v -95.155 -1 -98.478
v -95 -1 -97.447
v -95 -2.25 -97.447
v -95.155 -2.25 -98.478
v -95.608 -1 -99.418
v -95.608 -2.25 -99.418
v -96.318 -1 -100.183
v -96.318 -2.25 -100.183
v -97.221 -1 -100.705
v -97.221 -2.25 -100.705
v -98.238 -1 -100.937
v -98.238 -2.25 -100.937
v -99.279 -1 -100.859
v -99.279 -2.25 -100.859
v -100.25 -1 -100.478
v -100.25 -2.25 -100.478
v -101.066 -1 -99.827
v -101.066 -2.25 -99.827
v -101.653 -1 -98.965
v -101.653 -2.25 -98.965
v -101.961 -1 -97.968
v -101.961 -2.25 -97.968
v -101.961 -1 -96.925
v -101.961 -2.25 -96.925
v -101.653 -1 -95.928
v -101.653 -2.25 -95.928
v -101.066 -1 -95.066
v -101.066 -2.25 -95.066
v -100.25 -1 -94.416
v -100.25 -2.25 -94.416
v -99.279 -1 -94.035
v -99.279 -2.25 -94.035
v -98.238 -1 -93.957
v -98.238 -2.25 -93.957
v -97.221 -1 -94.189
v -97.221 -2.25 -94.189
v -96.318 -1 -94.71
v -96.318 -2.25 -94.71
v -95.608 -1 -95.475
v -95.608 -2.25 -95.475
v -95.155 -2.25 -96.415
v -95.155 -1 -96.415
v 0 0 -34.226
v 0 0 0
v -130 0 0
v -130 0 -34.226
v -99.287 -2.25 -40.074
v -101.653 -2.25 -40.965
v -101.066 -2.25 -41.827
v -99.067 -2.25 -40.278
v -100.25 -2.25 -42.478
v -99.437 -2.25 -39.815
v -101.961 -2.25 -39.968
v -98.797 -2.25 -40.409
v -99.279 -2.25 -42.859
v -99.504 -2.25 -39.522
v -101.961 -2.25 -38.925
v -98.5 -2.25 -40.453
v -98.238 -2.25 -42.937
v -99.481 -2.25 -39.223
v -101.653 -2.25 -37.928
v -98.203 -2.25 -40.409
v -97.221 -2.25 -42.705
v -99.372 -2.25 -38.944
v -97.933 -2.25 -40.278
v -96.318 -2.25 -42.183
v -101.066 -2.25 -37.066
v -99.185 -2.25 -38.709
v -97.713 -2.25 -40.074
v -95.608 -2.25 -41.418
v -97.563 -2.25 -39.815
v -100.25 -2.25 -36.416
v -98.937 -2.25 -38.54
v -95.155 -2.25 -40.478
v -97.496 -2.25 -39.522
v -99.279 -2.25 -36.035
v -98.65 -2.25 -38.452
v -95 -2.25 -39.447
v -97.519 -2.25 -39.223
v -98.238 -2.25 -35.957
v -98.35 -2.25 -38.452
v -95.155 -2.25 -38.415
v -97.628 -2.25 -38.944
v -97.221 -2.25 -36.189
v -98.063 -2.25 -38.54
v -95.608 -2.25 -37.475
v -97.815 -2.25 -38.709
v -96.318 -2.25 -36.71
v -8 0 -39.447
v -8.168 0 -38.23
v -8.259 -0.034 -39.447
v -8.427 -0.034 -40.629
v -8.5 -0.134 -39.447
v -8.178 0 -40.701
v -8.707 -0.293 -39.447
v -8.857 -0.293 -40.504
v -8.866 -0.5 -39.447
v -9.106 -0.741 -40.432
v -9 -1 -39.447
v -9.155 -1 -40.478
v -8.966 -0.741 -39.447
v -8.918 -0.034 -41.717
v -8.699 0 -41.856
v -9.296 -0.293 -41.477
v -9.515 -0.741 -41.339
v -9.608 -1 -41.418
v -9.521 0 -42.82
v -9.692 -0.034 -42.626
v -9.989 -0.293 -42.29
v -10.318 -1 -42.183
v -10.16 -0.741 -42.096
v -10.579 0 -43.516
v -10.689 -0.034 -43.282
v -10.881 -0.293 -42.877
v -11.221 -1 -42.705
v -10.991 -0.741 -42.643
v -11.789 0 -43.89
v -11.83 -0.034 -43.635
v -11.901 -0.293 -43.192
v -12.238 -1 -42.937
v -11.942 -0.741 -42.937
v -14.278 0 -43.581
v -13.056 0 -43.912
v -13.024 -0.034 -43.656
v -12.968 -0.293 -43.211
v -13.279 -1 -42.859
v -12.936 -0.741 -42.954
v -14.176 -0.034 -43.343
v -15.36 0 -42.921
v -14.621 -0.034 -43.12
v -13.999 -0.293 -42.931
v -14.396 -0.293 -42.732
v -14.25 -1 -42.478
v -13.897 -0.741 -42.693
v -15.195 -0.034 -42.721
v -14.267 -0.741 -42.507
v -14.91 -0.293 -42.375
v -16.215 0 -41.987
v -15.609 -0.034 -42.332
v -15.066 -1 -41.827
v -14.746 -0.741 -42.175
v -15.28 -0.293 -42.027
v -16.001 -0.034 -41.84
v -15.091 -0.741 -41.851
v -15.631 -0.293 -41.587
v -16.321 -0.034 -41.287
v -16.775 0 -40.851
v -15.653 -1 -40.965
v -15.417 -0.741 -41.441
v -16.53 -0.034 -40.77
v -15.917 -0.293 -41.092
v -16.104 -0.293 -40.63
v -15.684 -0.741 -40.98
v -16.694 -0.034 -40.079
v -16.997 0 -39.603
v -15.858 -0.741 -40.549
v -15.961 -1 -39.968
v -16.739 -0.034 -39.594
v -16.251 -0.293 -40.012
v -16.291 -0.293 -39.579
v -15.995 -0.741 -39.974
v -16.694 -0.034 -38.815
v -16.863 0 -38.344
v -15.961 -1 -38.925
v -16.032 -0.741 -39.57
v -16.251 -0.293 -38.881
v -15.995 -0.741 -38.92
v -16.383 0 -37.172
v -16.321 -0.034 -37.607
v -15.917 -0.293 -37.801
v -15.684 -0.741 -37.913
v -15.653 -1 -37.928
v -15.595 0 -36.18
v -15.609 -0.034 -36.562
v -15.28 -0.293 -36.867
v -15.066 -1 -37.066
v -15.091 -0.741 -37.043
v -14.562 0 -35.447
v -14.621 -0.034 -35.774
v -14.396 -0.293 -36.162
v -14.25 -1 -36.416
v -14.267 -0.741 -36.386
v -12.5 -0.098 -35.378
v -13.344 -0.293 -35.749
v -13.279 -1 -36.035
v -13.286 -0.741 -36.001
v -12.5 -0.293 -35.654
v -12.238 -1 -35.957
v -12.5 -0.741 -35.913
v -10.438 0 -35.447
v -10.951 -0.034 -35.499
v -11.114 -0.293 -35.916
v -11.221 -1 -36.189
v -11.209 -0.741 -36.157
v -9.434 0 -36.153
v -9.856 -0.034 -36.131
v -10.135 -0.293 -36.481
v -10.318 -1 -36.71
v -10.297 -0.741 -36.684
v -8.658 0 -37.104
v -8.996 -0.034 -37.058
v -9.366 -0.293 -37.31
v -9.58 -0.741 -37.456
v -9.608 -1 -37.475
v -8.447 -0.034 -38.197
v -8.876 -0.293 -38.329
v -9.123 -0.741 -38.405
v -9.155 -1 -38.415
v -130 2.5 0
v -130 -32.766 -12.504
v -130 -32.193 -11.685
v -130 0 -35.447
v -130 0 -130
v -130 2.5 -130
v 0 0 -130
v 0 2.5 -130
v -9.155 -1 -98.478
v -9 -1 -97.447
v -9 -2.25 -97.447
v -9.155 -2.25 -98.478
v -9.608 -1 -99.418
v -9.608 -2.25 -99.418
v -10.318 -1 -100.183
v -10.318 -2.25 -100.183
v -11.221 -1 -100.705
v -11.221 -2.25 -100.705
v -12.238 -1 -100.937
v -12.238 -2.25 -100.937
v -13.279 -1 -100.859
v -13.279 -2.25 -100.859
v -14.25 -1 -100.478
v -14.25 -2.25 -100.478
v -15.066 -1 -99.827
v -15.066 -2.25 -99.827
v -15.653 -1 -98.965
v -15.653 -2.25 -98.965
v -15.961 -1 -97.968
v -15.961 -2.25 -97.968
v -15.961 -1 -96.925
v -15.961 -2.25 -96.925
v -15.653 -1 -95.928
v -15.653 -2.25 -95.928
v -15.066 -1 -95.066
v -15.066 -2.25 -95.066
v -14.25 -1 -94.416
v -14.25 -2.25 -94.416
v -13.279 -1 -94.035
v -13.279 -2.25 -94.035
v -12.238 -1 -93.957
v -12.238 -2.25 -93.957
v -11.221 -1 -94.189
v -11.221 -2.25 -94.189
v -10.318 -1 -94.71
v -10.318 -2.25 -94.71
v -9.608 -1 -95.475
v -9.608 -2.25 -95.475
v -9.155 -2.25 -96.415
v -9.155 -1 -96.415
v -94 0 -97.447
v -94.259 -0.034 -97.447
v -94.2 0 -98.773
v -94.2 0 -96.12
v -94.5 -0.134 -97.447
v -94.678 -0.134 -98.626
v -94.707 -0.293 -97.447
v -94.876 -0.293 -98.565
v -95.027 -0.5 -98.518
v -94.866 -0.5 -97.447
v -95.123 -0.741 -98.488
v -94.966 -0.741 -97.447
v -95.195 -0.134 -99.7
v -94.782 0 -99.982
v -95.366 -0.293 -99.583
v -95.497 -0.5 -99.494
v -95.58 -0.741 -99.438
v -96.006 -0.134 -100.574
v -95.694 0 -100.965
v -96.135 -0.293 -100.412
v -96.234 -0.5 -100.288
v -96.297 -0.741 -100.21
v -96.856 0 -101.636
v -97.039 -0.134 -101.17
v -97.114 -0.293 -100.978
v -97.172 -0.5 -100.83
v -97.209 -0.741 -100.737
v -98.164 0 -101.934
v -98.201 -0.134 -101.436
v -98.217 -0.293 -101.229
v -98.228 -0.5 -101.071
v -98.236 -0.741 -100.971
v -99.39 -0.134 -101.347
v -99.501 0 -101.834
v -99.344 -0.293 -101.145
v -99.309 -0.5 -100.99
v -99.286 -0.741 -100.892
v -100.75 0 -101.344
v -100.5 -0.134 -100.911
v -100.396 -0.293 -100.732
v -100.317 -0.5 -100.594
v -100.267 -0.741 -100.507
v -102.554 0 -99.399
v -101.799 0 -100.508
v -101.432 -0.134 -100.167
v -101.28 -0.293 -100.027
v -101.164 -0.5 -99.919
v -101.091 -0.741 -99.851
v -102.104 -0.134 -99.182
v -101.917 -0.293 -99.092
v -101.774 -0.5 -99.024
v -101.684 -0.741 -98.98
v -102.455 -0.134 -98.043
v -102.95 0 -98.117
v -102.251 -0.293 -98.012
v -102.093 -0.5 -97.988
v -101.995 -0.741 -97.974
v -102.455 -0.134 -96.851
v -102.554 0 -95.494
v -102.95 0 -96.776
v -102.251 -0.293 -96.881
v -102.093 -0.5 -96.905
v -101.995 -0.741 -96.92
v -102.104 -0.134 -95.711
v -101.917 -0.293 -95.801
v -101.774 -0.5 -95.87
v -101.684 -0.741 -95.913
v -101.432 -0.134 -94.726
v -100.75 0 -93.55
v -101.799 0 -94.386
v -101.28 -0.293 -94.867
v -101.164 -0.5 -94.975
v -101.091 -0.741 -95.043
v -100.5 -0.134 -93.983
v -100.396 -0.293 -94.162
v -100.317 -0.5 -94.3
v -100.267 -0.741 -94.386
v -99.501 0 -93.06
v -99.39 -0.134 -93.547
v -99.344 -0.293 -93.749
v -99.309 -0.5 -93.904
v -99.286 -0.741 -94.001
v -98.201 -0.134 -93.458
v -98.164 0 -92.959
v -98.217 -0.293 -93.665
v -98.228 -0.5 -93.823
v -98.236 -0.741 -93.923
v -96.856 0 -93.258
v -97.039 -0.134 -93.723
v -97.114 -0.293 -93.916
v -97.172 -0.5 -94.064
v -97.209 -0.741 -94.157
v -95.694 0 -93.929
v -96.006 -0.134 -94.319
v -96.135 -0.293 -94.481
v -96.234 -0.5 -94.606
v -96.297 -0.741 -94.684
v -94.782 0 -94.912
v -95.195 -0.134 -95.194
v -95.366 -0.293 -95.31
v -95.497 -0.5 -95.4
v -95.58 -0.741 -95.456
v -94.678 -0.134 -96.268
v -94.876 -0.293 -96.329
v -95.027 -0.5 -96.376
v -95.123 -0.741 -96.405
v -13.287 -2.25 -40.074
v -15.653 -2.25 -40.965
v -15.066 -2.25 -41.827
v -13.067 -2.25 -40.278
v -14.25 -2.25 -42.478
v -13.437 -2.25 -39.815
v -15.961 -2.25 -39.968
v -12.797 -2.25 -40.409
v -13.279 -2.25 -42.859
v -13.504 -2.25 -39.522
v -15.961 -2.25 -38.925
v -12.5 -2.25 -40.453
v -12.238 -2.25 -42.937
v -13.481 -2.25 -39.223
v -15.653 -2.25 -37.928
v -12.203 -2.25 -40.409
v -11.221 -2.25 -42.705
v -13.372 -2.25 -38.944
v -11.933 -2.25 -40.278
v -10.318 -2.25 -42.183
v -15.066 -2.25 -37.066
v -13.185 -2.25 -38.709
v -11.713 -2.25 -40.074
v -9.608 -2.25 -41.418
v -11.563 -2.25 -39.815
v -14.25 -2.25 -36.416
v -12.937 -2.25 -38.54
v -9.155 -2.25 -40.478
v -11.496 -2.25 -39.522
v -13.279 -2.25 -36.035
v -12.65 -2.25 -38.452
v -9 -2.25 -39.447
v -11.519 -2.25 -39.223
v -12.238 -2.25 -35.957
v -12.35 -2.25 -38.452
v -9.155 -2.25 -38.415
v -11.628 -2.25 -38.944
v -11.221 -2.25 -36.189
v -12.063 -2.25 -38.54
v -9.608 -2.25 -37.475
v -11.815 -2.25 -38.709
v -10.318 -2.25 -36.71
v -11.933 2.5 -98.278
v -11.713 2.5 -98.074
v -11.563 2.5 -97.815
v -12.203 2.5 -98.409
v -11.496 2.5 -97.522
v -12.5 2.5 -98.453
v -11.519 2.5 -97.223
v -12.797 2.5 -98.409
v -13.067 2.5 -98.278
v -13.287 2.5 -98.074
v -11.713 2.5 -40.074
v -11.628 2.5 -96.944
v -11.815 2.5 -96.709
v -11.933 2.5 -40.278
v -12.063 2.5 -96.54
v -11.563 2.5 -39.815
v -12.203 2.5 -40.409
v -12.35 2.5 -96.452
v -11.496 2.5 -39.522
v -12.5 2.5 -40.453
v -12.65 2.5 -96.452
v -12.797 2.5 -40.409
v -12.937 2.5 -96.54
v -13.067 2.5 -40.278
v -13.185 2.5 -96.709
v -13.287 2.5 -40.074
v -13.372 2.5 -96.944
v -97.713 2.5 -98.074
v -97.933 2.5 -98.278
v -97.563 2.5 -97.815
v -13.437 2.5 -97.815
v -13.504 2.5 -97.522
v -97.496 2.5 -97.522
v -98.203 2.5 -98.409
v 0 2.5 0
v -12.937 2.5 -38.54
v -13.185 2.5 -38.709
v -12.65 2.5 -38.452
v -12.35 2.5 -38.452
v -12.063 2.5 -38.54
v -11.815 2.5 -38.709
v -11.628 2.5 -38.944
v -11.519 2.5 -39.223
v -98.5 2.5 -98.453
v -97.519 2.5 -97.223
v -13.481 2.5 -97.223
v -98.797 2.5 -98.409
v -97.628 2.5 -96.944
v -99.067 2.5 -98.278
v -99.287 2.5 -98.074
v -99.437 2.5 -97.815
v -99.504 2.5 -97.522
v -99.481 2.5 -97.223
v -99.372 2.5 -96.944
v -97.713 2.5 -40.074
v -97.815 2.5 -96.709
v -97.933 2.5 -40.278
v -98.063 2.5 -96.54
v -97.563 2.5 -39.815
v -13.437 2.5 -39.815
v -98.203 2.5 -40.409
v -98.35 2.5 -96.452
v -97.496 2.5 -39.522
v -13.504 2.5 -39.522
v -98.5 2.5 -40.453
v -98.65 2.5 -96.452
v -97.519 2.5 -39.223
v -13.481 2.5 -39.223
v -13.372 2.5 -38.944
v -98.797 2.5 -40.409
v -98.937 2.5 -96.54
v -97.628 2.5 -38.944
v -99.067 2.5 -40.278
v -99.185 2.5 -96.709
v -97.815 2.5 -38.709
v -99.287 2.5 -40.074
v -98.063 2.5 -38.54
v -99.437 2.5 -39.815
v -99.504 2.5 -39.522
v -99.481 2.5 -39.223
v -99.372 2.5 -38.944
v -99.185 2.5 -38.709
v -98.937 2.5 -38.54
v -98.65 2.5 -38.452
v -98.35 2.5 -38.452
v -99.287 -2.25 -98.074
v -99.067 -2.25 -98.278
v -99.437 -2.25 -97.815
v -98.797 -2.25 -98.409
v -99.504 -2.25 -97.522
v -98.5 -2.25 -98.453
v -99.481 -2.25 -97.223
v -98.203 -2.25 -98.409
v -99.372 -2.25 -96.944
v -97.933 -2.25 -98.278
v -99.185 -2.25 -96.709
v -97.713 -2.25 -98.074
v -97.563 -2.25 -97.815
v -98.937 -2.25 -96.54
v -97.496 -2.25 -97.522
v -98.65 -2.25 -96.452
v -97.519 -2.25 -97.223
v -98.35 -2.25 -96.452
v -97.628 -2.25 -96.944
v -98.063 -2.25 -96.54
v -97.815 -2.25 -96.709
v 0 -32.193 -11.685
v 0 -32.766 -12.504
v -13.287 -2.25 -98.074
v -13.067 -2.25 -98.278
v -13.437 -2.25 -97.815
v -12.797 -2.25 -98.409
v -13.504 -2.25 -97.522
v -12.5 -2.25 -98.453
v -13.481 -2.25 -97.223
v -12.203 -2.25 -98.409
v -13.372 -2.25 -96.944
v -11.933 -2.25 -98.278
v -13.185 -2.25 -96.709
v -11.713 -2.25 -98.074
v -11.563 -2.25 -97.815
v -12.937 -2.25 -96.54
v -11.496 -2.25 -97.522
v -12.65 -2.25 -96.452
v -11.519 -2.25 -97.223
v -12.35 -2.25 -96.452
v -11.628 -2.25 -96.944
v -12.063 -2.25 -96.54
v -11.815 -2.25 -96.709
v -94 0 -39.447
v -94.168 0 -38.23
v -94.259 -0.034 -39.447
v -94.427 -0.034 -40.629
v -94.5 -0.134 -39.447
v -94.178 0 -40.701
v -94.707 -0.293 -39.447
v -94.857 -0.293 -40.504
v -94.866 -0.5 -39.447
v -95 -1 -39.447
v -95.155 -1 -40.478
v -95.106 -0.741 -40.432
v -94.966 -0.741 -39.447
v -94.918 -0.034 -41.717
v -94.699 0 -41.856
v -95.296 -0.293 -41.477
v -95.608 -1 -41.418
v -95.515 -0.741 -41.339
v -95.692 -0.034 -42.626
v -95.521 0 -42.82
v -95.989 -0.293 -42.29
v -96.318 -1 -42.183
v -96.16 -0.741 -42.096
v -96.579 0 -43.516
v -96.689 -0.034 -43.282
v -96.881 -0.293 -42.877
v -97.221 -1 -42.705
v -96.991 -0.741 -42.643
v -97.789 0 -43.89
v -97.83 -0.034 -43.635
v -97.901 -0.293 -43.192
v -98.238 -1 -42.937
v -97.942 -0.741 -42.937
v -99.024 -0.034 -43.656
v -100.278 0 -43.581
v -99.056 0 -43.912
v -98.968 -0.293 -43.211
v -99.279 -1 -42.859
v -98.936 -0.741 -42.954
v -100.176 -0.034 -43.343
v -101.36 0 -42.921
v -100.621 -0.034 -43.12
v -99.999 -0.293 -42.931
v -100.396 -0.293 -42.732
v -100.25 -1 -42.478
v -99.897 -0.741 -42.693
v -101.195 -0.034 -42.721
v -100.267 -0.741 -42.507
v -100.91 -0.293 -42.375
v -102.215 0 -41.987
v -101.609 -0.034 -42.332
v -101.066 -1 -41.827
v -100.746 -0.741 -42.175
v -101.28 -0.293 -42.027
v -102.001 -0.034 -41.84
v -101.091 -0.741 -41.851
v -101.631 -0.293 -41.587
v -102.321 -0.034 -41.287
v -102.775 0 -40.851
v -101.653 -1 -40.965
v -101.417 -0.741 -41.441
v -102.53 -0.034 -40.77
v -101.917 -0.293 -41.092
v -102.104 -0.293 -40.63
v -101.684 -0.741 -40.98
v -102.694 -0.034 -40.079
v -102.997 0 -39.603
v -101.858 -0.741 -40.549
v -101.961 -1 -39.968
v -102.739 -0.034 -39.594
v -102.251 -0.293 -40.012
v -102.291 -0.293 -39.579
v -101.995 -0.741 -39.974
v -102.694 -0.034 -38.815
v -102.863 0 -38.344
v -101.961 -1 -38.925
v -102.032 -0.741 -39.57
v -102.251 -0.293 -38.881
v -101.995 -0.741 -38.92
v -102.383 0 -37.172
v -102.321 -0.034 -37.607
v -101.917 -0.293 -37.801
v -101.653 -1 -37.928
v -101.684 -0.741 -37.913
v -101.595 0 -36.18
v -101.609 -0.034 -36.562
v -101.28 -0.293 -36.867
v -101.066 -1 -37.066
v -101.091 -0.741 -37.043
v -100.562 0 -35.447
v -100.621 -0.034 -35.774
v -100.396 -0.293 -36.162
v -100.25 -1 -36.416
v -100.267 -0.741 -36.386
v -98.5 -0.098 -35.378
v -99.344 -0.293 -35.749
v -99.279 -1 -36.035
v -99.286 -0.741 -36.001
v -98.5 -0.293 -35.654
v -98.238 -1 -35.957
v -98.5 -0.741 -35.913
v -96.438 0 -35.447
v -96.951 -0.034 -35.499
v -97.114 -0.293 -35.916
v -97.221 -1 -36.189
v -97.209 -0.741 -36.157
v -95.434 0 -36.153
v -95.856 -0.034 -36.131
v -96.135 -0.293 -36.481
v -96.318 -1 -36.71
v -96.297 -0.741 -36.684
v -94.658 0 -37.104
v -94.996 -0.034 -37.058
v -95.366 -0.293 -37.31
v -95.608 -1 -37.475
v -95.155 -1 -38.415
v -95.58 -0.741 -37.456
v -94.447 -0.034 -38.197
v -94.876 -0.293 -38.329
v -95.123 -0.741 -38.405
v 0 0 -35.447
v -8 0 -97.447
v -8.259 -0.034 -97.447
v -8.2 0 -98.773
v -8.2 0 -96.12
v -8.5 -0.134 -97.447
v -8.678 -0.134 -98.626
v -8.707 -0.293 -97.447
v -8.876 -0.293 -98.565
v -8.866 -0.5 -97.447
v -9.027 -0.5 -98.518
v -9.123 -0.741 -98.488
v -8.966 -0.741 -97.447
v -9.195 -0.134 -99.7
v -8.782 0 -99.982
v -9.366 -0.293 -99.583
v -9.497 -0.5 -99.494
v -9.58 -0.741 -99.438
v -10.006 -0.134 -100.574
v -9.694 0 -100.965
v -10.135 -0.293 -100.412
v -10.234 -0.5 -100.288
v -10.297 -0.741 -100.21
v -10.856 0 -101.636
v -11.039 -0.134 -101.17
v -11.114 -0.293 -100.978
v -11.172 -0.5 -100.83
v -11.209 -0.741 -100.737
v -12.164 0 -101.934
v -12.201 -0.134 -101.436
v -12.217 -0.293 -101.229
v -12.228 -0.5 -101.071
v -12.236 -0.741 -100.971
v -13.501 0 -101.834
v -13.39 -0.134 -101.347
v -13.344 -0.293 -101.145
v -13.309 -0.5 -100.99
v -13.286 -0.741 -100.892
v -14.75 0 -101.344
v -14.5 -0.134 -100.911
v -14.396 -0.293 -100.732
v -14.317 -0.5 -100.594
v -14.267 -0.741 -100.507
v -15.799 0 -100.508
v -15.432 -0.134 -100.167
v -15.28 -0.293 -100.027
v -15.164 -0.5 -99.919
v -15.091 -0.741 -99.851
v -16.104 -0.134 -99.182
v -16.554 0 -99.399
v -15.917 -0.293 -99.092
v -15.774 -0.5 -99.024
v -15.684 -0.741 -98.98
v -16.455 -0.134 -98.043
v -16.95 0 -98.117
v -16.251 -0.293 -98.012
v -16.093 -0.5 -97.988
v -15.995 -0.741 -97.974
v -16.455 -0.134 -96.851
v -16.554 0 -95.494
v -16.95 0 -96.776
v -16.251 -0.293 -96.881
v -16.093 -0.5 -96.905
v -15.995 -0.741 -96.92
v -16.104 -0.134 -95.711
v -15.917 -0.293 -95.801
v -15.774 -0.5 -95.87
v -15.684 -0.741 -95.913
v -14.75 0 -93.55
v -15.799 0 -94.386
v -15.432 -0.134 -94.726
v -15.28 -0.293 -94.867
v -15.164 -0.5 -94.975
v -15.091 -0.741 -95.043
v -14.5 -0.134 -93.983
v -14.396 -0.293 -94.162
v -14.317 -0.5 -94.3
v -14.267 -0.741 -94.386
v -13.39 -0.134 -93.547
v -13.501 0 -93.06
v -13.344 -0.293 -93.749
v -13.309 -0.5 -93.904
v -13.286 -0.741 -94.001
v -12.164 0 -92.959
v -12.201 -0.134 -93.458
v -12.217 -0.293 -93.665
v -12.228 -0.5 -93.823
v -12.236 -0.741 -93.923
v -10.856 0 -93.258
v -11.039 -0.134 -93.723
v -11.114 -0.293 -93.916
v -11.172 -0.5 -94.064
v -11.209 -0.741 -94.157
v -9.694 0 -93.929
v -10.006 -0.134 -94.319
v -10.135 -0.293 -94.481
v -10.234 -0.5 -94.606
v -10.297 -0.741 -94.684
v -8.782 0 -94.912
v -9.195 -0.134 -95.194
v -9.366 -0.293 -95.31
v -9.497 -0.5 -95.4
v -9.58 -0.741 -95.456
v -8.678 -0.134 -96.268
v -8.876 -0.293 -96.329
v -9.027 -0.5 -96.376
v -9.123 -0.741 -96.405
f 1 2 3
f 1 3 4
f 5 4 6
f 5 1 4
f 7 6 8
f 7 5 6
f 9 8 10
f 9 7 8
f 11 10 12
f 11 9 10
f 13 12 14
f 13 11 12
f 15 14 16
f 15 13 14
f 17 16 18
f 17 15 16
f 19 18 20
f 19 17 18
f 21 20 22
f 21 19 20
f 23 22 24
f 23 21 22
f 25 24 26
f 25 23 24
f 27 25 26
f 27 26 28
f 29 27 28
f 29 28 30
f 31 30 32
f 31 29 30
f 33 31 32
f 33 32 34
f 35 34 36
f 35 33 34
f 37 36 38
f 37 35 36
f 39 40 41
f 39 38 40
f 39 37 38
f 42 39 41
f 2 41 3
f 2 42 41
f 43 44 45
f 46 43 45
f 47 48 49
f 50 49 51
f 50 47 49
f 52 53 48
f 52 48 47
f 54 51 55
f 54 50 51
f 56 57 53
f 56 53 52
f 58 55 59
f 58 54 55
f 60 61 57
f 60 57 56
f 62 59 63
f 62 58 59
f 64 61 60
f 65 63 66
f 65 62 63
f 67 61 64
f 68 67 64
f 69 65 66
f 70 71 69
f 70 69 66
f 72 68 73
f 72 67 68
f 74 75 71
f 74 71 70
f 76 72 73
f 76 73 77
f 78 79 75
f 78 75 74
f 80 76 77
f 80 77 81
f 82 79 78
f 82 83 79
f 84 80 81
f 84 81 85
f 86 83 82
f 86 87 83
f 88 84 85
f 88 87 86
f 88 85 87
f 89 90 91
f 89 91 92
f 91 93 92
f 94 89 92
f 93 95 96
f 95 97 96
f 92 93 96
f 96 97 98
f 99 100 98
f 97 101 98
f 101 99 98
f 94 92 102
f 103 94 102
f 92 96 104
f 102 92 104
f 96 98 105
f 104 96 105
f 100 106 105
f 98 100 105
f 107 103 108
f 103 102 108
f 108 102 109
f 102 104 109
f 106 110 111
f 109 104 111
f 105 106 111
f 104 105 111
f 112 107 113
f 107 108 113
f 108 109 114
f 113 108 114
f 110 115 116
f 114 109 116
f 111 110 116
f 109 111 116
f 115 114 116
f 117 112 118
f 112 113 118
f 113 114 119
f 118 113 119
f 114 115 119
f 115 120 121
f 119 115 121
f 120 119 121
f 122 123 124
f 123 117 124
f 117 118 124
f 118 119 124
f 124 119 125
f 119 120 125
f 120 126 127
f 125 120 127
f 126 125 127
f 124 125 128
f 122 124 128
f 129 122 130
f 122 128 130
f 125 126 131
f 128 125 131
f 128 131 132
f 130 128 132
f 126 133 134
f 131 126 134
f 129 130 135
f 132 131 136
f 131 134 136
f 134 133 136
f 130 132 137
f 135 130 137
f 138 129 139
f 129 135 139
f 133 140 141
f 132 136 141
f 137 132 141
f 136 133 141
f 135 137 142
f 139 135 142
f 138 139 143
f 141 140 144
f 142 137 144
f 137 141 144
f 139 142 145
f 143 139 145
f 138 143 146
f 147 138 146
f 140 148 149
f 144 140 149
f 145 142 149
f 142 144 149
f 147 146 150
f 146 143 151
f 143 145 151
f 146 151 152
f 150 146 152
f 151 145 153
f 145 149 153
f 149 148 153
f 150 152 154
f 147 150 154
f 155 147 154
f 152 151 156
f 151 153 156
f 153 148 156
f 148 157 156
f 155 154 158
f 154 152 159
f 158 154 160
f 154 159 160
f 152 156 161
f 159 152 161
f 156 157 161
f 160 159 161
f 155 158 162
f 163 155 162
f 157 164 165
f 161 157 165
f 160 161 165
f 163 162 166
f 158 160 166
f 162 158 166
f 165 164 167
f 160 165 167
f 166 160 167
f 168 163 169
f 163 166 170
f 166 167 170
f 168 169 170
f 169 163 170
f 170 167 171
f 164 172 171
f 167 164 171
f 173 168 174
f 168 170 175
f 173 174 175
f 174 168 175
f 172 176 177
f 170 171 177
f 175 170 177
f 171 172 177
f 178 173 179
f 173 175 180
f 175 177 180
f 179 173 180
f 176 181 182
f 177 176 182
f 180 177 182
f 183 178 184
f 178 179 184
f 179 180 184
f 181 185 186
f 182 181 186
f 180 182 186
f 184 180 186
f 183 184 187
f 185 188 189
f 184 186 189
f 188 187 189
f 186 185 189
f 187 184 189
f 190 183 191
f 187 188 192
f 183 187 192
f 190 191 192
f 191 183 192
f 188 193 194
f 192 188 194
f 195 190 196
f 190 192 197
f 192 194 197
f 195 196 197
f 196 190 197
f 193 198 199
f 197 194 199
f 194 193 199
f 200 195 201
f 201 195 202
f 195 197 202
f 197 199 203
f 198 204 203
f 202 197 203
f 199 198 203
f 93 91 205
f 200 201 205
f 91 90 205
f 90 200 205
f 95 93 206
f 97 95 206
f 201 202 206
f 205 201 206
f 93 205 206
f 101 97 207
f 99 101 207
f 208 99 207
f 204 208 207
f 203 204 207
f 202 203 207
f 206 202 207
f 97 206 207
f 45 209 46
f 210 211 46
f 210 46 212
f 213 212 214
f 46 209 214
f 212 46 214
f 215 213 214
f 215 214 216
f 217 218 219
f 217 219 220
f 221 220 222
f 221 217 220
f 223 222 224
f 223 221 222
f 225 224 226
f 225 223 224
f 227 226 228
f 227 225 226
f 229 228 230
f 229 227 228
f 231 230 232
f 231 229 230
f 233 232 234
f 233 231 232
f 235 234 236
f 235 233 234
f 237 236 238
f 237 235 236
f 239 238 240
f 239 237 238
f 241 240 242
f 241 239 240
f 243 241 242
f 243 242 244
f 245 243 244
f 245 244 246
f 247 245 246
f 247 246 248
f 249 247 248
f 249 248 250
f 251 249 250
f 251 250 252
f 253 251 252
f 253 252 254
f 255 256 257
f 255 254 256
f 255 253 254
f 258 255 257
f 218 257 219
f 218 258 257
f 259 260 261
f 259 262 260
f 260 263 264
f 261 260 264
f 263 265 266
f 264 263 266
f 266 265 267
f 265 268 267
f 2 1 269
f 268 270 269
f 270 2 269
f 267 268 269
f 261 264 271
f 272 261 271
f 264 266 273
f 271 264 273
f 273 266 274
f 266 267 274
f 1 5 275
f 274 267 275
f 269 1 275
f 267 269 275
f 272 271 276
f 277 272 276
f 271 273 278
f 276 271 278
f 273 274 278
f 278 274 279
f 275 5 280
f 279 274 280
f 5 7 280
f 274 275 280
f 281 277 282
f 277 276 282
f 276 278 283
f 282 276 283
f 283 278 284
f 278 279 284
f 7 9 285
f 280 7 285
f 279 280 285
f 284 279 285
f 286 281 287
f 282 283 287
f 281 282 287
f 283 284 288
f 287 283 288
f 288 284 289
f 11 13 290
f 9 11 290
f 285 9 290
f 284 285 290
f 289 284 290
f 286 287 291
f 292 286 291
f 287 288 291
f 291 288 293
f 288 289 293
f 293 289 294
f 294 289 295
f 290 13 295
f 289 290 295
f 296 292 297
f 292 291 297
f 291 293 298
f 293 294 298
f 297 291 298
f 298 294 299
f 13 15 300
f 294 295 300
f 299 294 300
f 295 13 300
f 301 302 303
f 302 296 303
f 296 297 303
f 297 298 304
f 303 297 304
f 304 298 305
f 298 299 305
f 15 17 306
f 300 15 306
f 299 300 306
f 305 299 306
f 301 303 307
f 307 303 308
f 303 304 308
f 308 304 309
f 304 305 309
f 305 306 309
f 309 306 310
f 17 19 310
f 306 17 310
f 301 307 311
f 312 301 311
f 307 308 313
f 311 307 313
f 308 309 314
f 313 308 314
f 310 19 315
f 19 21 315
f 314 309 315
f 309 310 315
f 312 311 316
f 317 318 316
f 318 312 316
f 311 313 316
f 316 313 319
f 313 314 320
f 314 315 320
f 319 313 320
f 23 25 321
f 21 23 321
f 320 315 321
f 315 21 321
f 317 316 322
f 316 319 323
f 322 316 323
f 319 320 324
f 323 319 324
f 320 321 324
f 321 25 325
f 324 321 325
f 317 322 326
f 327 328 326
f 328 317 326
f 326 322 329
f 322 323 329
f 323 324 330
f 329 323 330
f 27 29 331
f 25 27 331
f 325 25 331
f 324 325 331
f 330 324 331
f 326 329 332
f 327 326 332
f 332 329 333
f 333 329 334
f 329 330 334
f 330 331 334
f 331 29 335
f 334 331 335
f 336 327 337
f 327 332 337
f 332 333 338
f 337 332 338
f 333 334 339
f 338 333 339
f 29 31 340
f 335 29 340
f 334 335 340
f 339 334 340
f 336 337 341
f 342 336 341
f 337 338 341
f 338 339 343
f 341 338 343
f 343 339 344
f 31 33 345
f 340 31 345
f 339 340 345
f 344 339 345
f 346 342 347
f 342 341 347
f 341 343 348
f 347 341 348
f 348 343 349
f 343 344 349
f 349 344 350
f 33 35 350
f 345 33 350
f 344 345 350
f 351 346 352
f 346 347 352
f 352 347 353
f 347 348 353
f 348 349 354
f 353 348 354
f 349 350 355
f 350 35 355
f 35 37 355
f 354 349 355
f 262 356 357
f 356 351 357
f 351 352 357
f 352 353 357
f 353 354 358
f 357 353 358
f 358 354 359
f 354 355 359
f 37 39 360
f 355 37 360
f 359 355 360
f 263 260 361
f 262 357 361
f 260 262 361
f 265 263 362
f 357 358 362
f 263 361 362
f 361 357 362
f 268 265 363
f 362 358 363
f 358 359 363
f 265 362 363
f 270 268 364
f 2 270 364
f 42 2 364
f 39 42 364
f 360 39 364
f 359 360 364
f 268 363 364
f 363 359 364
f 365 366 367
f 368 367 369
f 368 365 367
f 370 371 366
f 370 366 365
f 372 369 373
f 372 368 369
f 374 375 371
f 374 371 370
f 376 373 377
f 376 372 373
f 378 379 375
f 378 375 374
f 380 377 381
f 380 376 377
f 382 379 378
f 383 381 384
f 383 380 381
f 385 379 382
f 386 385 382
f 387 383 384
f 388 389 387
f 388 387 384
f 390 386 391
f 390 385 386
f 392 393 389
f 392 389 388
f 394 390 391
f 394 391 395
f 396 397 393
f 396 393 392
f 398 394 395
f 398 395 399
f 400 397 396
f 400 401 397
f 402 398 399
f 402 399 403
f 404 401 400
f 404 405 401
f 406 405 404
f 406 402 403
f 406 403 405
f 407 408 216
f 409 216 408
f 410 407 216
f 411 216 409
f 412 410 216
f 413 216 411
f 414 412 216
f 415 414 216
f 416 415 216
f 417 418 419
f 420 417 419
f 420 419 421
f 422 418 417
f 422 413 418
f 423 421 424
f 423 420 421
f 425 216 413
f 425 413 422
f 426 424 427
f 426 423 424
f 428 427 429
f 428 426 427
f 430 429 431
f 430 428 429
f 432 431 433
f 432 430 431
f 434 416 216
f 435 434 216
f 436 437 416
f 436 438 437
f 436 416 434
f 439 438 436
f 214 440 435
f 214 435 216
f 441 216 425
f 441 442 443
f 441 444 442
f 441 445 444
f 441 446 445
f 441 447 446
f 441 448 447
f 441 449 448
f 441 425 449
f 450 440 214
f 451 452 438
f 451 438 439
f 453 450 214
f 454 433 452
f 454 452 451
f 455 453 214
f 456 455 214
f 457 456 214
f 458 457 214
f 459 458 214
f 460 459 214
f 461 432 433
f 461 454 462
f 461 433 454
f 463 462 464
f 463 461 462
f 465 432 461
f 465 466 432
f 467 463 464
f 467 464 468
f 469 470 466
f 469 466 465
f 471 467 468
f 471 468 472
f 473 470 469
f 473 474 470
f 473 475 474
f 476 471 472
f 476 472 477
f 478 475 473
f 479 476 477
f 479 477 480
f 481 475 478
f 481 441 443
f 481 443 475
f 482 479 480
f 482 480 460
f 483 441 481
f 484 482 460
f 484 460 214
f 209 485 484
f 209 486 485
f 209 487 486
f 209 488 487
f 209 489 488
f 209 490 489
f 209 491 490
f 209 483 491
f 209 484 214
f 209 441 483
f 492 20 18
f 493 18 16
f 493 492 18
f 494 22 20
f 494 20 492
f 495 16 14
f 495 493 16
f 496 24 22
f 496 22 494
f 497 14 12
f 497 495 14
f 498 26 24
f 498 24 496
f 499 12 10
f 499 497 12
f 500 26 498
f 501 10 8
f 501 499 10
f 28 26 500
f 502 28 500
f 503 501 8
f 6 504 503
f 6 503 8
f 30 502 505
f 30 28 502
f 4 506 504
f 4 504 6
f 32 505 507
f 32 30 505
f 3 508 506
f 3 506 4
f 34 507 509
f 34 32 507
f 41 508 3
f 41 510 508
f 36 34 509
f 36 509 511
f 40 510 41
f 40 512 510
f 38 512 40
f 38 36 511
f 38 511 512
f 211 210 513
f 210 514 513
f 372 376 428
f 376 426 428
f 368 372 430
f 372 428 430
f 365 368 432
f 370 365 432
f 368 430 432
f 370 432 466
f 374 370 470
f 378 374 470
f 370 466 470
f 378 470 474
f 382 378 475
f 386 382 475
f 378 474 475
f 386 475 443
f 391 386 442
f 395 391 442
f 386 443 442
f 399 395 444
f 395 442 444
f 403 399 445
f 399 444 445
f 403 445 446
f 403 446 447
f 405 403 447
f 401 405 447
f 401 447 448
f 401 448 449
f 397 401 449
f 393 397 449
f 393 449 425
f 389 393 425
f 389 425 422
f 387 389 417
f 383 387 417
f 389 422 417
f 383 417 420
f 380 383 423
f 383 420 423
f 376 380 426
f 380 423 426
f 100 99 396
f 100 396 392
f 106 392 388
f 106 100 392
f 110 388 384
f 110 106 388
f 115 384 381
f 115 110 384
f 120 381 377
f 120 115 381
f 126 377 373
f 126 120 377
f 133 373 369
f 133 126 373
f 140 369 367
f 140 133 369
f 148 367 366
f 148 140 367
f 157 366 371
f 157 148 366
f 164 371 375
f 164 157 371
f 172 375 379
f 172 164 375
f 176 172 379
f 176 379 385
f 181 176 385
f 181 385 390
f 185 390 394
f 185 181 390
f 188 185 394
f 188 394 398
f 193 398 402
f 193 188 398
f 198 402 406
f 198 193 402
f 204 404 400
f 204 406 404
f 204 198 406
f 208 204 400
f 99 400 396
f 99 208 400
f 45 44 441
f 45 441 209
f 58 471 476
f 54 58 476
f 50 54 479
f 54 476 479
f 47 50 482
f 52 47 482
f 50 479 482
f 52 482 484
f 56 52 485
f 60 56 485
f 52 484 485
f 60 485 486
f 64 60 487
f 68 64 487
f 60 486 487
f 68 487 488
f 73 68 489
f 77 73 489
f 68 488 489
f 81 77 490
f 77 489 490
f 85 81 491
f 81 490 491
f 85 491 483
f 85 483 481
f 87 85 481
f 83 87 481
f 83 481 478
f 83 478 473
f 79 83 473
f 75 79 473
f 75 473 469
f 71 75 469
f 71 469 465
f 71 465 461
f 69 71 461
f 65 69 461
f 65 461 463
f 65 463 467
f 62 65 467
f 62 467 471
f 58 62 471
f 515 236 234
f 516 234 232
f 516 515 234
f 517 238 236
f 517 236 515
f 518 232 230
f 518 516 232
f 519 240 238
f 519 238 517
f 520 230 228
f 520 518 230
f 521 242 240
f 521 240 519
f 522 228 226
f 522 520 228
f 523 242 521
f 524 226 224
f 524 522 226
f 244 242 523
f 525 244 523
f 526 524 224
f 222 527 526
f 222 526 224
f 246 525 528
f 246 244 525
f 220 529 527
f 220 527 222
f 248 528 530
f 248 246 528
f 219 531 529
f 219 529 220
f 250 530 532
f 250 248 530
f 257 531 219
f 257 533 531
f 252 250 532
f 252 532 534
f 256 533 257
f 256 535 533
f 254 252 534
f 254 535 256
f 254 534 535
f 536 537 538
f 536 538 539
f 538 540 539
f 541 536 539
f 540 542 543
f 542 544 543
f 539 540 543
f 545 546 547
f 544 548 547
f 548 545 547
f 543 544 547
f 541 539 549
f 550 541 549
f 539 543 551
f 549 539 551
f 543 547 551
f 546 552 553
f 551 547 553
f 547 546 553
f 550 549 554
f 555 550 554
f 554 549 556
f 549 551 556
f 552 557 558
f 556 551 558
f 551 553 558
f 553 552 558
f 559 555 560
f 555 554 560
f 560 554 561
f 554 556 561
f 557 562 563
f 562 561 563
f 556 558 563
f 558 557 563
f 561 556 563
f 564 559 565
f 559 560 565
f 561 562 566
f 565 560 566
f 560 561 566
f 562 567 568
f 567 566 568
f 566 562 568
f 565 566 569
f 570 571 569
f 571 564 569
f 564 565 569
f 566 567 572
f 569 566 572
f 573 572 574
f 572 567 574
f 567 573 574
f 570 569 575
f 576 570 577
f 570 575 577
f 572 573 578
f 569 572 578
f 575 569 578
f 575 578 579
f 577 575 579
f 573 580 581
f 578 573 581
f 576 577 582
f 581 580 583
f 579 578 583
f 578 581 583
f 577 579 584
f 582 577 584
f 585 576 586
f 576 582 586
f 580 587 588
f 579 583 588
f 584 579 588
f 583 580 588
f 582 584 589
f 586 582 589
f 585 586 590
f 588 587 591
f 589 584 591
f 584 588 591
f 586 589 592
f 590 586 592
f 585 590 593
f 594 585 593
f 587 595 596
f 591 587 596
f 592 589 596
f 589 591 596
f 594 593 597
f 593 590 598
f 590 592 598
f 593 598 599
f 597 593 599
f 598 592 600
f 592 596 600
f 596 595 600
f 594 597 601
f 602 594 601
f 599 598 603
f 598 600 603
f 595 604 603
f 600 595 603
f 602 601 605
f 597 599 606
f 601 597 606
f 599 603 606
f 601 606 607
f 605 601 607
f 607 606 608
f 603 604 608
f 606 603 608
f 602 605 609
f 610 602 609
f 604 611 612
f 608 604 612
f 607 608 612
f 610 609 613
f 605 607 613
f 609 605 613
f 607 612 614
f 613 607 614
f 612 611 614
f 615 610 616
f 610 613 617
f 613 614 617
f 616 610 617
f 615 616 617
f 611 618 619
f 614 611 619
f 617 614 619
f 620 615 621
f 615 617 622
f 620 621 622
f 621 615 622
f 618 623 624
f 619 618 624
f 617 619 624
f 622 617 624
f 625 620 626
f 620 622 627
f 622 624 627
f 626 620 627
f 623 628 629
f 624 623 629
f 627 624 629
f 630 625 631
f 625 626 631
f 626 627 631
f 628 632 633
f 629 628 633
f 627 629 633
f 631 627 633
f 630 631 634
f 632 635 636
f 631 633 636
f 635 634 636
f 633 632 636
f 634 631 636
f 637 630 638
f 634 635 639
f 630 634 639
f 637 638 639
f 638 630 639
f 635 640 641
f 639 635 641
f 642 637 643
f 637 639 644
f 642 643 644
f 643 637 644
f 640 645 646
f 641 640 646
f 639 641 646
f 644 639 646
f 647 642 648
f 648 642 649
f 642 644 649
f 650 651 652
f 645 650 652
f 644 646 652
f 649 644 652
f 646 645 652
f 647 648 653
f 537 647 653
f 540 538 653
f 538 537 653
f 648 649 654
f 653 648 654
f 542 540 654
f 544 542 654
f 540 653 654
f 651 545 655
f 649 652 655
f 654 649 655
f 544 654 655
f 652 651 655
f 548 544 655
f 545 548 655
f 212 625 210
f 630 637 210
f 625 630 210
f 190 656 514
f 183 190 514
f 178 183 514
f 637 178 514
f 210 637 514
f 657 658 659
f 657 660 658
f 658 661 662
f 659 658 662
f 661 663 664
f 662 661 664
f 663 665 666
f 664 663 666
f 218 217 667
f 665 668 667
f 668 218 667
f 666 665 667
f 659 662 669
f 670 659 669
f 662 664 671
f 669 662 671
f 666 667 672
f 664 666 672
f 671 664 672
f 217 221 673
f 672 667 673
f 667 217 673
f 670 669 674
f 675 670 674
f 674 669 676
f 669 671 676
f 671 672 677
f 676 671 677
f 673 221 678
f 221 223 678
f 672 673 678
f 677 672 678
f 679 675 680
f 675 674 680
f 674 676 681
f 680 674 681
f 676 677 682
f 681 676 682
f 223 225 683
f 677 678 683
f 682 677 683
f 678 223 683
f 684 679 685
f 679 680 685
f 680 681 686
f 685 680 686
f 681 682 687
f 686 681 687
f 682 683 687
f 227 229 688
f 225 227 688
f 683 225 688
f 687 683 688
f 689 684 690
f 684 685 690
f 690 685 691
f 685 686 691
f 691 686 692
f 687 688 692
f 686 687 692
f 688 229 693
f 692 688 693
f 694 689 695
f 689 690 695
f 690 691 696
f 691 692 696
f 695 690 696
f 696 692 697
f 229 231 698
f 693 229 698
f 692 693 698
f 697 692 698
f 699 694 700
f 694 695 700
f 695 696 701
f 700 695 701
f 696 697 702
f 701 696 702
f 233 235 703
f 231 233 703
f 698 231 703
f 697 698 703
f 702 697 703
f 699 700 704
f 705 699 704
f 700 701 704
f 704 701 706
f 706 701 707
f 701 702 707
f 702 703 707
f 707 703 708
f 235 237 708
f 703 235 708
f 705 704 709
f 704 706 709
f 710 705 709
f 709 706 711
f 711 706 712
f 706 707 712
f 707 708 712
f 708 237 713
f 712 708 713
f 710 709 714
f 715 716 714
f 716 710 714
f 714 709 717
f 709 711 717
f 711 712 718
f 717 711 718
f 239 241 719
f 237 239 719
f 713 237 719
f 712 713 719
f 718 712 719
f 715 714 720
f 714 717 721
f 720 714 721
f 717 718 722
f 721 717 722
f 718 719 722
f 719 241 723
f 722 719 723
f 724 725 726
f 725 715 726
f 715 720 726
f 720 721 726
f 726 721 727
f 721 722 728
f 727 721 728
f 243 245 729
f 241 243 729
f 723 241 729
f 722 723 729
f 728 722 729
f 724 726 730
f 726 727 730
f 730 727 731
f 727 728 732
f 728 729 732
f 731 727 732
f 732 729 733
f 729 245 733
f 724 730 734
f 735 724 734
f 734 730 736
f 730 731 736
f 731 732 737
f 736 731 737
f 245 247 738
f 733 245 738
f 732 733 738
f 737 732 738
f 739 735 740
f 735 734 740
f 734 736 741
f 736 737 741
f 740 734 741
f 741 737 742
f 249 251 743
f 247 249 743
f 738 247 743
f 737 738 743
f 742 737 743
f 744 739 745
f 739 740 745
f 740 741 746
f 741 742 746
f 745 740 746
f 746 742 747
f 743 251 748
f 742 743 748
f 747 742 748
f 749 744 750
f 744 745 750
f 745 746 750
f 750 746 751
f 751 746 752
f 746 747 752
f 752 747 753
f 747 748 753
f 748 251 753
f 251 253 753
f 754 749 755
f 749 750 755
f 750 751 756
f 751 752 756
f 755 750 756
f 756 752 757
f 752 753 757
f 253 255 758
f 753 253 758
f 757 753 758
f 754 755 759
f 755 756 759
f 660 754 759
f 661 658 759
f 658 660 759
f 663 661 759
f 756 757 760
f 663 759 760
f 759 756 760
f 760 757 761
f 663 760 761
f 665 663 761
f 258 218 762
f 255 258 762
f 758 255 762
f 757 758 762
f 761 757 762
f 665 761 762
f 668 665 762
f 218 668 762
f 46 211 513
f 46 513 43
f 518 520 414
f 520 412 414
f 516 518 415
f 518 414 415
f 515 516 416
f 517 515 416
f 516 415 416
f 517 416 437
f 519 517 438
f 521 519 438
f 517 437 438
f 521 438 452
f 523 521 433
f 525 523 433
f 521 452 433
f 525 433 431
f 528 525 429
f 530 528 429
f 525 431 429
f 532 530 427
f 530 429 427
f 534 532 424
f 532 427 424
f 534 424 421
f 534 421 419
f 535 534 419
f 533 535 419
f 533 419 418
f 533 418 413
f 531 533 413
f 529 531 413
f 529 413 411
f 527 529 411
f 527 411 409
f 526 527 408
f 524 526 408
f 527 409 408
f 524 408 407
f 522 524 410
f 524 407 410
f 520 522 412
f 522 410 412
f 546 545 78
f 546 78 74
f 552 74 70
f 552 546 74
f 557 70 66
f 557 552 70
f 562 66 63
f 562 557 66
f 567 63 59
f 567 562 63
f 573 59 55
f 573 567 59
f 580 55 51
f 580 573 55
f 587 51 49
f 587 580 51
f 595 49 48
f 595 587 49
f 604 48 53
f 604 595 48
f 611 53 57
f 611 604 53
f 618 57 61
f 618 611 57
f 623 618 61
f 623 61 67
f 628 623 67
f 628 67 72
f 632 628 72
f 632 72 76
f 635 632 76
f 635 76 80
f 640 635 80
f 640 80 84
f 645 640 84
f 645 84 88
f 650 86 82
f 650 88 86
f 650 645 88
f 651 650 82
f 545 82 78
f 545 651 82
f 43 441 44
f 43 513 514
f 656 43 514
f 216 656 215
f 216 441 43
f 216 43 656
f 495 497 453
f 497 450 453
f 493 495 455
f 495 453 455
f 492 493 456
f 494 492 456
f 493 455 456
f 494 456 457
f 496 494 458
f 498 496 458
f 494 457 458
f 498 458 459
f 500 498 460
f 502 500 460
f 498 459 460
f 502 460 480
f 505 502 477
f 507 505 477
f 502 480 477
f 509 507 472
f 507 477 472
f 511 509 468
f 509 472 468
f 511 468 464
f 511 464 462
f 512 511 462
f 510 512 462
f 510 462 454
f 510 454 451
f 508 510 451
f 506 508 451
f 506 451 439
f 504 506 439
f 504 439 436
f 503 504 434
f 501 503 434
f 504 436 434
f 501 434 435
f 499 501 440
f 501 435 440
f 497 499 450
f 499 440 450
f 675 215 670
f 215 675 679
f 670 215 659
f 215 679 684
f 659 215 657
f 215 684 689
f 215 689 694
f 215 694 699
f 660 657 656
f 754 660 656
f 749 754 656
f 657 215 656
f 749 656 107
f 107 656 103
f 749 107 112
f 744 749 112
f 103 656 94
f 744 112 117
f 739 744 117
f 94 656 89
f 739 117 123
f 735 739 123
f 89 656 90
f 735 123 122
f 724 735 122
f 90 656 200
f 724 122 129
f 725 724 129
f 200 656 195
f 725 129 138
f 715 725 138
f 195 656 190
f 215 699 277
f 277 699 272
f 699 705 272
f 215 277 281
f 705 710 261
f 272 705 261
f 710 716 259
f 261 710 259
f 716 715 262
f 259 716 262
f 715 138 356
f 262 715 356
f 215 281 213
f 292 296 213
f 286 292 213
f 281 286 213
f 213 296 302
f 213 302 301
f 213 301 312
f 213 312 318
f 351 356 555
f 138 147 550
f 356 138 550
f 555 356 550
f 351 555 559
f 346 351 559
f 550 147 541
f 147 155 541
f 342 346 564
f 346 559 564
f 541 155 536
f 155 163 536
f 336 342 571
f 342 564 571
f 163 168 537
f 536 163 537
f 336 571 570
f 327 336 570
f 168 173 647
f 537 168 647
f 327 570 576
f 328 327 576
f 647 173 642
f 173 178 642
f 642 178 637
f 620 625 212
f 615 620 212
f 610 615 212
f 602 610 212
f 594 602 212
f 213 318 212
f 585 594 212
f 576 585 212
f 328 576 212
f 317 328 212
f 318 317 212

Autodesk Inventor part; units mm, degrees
ref_plane "YZ Plane" through (0, 0, 0) normal (1, 0, 0) x (0, 1, 0)
ref_plane "XZ Plane" through (0, 0, 0) normal (0, 1, 0) x (-1, 0, 0)
ref_plane "XY Plane" through (0, 0, 0) normal (0, 0, 1) x (1, 0, 0)
sketch "Sketch1" plane through (0, 0, 0) normal (0, 1, 0) x (-1, 0, 0)
  line L0 (0, 0) -> (130, 0)
  line L1 (130, 0) -> (130, -130)
  line L2 (130, -130) -> (0, -130)
  line L3 (0, -130) -> (0, 0)
  dimension "d0" = 130
  dimension "d1" = 130
extrude "Extrusion1" add sketch "Sketch1" along normal blind 2.5
sketch "Sketch2" plane through (0, 0, 0) normal (0, -1, 0) x (1, 0, 0)
  line L0 (-2.5, -114.4468) -> (-102.5, -114.4468) construction
  line L1 (-102.5, -114.4468) -> (-102.5, -35.4468) construction
  line L2 (-102.5, -35.4468) -> (-2.5, -35.4468) construction
  line L3 (-2.5, -35.4468) -> (-2.5, -114.4468) construction
  line L4 (-12.5, -97.4468) -> (-98.5, -97.4468) construction
  line L5 (-98.5, -97.4468) -> (-98.5, -39.4468) construction
  line L6 (-98.5, -39.4468) -> (-12.5, -39.4468) construction
  line L7 (-12.5, -39.4468) -> (-12.5, -97.4468) construction
  line L8 (0, 0) -> (-130, 0) construction
  line L9 (-130, -130) -> (0, -130) construction
  line L10 (-130, 0) -> (-130, -130) construction
  circle A0 centre (-12.5, -97.4468) radius 3.5
  circle A1 centre (-98.5, -97.4468) radius 3.5
  circle A2 centre (-12.5, -39.4468) radius 3.5
  circle A3 centre (-98.5, -39.4468) radius 3.5
  line L11 (0, -130) -> (0, 0) projected
  line L12 (-91.6778, -53.8) -> (-93.3369, -53.8) construction
  line L13 (-93.3369, -53.8) -> (-93.3369, -76.2) construction
  line L14 (-93.3369, -76.2) -> (-91.6778, -76.2) construction
  line L15 (-91.6778, -76.2) -> (-91.6778, -53.8) construction
  dimension "d4" = 86
  dimension "d5" = 58
  dimension "d6" = 100
  dimension "d7" = 79
  dimension "d8" = 4
  dimension "d9" = 4
  dimension "d10" = 130
  dimension "d13" = 7
  dimension "d14" = 7
  dimension "d15" = 7
  dimension "d16" = 7
  dimension "d27" = 2.5
  dimension "d34" = 22.4
  dimension "d35" = 21.2468
  dimension "d36" = 53.8
extrude "Extrusion2" add sketch "Sketch2" along normal blind 2.25
fillet "Fillet1" radius 1 4 edges at (-16, 0, -97.4468) (-16, 0, -39.4468) (-102, 0, -39.4468) (-102, 0, -97.4468)
sketch "Sketch3" plane through (-12.5, -2.25, -97.4468) normal (0, -1, 0) x (1, 0, 0)
  circle A0 centre (0, 0) radius 3.5 construction
  circle A1 centre (-86, 0) radius 3.5 construction
  circle A2 centre (0, 58) radius 3.5 construction
  circle A3 centre (-86, 58) radius 3.5 construction
  circle A4 centre (0, 0) radius 4.5 construction
  circle A5 centre (-86, 58) radius 3.5 construction
  point P0 (12.5, 97.4468)
  point P1 (0, 58)
  point P2 (-86, 58)
  point P3 (-86, 0)
hole "Hole1" at (-12.5, -2.25, -97.4468) at (-12.5, -2.25, -39.4468) at (-98.5, -2.25, -39.4468) at (-98.5, -2.25, -97.4468) direction (0, 1, 0) diameter 2.013 depth 4.75 thread size "M2.5x0.45" class "6H" standard "ANSI Metric M Profile"
sketch "Sketch4" plane through (0, 0, 0) normal (1, 0, 0) x (0, 0, -1)
  line L0 (130, 0) -> (0, 0) projected
  line L1 (35.4468, 0) -> (1.8296, -48.0104) construction
  line L2 (35.4468, 0) -> (12.5038, -32.7661)
  line L3 (12.5038, -32.7661) -> (11.6846, -32.1925)
  line L4 (11.6846, -32.1925) -> (34.2261, 0)
  line L5 (35.4468, 0) -> (34.2261, 0)
  point P0 (35.4468, 0)
  dimension "d28" = 55
  dimension "d29" = 0
  dimension "d30" = 1
  dimension "d31" = 40
extrude "Extrusion3" add sketch "Sketch4" against normal blind 130
sketch "Sketch5" plane through (0, 2.5, 0) normal (1, 0, 0) x (0, 0, -1)
  line L0 (34.2261, -2.5) -> (11.6846, -34.6925) projected
  point P0 (0, -2.5)
equation "\"d9\" = d8"
equation "\"d14\" = d13"
equation "\"d15\" = d14"
equation "\"d16\" = d15"
equation "\"d36\" = -0.5 * d34 + 0.5 * d10"
properties part number "angle test"
